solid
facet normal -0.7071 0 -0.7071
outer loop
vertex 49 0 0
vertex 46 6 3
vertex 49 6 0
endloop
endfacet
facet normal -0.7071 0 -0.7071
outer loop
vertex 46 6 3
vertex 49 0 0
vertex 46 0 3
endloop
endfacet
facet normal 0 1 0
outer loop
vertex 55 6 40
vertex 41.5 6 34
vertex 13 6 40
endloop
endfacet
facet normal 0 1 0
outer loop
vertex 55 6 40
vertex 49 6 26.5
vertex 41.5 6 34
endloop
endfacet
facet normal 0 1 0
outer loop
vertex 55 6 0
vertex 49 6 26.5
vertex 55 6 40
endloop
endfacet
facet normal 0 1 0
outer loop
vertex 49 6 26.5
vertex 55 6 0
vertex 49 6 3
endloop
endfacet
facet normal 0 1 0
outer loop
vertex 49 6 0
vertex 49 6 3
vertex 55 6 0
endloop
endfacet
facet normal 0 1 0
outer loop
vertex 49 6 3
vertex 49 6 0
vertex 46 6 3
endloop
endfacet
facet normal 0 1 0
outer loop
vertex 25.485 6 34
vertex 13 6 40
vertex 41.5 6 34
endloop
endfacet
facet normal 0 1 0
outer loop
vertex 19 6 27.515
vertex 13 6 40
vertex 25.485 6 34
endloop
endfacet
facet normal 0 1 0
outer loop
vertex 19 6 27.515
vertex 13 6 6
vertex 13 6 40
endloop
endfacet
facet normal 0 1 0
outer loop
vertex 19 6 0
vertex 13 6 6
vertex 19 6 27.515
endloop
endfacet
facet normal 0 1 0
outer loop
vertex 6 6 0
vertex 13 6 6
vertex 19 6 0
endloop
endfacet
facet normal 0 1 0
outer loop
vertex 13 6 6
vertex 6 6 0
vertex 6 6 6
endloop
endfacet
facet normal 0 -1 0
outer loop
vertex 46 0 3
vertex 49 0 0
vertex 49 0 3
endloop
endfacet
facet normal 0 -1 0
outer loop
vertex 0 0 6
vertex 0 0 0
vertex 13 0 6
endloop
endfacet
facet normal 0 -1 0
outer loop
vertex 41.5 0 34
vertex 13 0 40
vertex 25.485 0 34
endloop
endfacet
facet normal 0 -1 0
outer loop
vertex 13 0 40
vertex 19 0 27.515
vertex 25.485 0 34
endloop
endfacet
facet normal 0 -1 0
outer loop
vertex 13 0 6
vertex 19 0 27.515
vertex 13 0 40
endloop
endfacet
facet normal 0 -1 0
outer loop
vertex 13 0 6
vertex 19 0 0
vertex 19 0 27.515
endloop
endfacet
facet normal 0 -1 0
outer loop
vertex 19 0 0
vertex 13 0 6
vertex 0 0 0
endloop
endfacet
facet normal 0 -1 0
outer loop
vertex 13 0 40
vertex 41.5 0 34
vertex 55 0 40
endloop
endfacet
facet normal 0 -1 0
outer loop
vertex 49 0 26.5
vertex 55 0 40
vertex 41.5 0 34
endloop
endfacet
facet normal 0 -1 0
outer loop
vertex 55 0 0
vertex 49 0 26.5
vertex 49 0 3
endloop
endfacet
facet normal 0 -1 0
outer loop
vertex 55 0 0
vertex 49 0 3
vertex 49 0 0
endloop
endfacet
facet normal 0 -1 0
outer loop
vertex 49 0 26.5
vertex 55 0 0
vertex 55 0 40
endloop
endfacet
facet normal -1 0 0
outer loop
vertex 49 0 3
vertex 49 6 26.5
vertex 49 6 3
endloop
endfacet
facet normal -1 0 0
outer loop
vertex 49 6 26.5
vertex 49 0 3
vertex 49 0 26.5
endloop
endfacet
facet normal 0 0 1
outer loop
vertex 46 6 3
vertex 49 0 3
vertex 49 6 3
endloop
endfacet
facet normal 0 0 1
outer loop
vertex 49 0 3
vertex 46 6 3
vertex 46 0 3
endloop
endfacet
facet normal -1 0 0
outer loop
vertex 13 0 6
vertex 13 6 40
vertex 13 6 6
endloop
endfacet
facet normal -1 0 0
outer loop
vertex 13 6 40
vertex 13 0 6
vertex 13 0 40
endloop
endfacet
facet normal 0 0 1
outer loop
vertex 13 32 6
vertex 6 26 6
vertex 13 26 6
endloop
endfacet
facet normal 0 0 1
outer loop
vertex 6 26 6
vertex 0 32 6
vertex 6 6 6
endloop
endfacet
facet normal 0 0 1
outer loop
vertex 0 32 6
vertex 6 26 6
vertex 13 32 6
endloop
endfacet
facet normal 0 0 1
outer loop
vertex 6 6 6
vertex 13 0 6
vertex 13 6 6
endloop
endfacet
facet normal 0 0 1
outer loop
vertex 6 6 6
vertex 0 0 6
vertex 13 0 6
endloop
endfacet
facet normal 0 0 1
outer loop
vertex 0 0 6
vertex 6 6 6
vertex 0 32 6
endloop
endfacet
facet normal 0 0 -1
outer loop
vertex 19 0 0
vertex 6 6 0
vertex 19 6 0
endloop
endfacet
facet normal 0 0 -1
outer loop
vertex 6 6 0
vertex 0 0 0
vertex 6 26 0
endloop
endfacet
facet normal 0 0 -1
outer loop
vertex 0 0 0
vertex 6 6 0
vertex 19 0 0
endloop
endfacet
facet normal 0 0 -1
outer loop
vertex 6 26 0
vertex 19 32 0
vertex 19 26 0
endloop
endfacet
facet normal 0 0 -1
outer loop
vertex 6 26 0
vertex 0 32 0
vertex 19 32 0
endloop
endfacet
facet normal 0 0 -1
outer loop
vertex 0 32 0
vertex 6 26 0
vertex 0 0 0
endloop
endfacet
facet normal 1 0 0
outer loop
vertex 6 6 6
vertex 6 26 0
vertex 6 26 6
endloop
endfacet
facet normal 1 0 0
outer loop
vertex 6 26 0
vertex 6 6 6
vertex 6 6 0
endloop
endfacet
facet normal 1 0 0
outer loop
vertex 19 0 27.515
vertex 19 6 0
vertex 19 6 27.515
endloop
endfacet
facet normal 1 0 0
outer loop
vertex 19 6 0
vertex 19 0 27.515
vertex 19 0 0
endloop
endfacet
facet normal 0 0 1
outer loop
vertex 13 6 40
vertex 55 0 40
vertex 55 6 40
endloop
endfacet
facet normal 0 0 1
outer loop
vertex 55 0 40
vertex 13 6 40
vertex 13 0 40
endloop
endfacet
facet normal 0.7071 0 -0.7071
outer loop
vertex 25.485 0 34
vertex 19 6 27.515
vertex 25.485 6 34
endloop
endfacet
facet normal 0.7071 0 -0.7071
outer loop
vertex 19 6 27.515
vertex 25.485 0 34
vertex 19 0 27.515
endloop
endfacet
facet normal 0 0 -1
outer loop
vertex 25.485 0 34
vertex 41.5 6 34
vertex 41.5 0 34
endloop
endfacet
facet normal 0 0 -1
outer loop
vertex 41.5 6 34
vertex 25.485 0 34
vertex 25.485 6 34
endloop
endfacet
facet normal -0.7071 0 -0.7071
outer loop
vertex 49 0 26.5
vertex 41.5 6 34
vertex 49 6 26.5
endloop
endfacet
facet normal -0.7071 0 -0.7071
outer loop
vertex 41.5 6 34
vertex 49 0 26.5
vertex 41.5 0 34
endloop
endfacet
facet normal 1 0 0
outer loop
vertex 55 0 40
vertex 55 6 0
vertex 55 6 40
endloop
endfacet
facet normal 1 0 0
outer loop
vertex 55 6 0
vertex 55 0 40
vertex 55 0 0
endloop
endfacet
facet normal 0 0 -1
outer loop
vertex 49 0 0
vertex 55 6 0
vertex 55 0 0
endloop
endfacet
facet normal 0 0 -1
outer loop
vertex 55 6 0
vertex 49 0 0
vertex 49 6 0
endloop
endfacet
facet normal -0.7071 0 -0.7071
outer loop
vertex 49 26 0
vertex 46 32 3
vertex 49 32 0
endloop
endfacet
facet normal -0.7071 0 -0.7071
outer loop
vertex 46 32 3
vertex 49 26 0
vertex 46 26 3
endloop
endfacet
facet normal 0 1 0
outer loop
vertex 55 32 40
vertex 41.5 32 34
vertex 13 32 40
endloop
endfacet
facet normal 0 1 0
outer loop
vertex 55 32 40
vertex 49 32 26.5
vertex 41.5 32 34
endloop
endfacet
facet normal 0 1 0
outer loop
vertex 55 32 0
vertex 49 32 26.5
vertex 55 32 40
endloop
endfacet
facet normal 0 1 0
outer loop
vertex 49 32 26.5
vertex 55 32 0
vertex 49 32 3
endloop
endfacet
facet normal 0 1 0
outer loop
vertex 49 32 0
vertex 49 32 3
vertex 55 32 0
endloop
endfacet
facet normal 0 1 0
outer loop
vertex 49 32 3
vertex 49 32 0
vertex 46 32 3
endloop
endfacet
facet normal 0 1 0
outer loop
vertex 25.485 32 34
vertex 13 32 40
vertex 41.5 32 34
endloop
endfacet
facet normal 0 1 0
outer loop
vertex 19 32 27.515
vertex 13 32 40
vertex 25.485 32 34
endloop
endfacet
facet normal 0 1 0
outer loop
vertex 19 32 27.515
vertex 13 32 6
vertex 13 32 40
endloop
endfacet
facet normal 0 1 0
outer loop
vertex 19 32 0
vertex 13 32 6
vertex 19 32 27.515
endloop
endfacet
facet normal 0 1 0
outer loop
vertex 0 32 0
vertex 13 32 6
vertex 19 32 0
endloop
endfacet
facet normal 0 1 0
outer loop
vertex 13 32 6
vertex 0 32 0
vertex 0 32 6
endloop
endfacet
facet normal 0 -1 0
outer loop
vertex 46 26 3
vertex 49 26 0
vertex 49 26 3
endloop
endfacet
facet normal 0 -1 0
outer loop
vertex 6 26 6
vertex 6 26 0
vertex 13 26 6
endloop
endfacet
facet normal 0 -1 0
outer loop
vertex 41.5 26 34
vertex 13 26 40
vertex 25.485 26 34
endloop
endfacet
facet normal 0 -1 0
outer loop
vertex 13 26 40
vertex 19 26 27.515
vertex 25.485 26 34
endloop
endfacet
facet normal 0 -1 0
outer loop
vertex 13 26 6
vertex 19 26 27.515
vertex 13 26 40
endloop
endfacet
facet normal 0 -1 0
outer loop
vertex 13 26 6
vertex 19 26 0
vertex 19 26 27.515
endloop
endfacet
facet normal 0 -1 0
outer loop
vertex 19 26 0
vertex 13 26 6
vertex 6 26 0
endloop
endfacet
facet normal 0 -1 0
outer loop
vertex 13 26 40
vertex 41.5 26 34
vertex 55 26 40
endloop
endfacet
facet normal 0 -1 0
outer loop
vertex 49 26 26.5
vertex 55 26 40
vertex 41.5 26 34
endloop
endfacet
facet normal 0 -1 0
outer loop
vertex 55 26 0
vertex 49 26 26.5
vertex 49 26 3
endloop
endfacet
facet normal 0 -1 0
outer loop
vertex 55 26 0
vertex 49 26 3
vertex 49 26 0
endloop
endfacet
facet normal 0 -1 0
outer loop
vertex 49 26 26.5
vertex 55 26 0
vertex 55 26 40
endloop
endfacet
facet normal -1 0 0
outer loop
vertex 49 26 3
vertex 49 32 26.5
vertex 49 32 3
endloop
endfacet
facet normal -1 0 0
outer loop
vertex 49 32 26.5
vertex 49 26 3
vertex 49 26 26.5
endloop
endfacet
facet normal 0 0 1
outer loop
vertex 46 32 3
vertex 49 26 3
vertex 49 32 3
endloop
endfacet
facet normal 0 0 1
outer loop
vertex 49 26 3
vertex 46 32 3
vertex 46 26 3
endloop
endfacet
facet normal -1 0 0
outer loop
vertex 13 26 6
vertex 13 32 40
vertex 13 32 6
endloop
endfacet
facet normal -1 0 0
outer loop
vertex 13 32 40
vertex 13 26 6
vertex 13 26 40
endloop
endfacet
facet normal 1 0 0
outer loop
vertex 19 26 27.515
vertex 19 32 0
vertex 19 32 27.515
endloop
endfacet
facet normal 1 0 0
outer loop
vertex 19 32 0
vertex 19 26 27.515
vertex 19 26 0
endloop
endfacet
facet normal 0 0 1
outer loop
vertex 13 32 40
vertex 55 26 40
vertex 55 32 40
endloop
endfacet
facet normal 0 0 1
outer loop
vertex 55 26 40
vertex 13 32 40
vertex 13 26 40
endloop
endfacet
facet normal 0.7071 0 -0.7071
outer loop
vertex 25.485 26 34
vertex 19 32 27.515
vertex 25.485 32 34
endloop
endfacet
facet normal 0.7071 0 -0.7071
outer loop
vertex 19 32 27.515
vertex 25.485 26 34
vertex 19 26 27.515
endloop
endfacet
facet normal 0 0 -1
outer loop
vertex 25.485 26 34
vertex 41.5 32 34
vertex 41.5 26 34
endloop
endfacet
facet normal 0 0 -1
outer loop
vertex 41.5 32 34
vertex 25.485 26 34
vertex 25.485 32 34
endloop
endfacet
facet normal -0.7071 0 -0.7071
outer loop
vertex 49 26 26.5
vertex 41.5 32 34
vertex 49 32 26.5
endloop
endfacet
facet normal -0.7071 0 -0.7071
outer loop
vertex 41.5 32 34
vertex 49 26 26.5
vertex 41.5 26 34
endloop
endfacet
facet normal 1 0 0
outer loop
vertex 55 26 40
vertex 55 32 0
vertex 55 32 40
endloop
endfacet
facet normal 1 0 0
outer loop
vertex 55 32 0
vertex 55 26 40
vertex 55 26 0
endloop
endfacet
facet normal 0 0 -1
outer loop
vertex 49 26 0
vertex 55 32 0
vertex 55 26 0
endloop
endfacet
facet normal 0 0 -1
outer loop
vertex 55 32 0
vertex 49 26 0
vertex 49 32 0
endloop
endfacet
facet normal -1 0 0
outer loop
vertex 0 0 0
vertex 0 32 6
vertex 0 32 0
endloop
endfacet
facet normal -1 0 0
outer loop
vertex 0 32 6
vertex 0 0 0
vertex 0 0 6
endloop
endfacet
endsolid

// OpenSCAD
stick_width = 20;
stick_thickness = 7;
chair_width = 30;
thickness = 6;
height_front = 40;
height_back = 40;
tooth_size = 3;

cube([thickness, thickness * 2 + stick_width, thickness]);

for(y = [0:thickness + stick_width:thickness + stick_width]) {
	translate([0, y, 0]) {
		translate([thickness, 0, 0])
			cube([stick_thickness, thickness, thickness]);
		translate([thickness + stick_thickness, 0, 0])
			cube([thickness, thickness, height_back]);
		translate([thickness + stick_thickness, 0, height_back * 3 / 4])
			rotate([0, 45, 0])
				cube([thickness, thickness, height_back * 1 / 4 * sqrt(2)]);
		translate([thickness * 2 + stick_thickness, 0, height_back - thickness])
			cube([chair_width, thickness, thickness]);
		translate([thickness * 2 + stick_thickness + chair_width * 3 / 4, 0, height_back - thickness])
			rotate([0, 45, 0])
				cube([chair_width * 1 / 4 * sqrt(2), thickness, thickness]);
		translate([thickness * 2 + stick_thickness + chair_width, 0, height_back - height_front])
			cube([thickness, thickness, height_front]);
		difference() {
			translate([thickness * 2 + stick_thickness + chair_width - tooth_size, 0, tooth_size])
				rotate([0, 45, 0])
					cube([tooth_size * sqrt(2), thickness, tooth_size * sqrt(2)]);
			translate([thickness * 2 + stick_thickness + chair_width - tooth_size, 0, tooth_size])
				cube([tooth_size, thickness, tooth_size]);
		}
	}
}
